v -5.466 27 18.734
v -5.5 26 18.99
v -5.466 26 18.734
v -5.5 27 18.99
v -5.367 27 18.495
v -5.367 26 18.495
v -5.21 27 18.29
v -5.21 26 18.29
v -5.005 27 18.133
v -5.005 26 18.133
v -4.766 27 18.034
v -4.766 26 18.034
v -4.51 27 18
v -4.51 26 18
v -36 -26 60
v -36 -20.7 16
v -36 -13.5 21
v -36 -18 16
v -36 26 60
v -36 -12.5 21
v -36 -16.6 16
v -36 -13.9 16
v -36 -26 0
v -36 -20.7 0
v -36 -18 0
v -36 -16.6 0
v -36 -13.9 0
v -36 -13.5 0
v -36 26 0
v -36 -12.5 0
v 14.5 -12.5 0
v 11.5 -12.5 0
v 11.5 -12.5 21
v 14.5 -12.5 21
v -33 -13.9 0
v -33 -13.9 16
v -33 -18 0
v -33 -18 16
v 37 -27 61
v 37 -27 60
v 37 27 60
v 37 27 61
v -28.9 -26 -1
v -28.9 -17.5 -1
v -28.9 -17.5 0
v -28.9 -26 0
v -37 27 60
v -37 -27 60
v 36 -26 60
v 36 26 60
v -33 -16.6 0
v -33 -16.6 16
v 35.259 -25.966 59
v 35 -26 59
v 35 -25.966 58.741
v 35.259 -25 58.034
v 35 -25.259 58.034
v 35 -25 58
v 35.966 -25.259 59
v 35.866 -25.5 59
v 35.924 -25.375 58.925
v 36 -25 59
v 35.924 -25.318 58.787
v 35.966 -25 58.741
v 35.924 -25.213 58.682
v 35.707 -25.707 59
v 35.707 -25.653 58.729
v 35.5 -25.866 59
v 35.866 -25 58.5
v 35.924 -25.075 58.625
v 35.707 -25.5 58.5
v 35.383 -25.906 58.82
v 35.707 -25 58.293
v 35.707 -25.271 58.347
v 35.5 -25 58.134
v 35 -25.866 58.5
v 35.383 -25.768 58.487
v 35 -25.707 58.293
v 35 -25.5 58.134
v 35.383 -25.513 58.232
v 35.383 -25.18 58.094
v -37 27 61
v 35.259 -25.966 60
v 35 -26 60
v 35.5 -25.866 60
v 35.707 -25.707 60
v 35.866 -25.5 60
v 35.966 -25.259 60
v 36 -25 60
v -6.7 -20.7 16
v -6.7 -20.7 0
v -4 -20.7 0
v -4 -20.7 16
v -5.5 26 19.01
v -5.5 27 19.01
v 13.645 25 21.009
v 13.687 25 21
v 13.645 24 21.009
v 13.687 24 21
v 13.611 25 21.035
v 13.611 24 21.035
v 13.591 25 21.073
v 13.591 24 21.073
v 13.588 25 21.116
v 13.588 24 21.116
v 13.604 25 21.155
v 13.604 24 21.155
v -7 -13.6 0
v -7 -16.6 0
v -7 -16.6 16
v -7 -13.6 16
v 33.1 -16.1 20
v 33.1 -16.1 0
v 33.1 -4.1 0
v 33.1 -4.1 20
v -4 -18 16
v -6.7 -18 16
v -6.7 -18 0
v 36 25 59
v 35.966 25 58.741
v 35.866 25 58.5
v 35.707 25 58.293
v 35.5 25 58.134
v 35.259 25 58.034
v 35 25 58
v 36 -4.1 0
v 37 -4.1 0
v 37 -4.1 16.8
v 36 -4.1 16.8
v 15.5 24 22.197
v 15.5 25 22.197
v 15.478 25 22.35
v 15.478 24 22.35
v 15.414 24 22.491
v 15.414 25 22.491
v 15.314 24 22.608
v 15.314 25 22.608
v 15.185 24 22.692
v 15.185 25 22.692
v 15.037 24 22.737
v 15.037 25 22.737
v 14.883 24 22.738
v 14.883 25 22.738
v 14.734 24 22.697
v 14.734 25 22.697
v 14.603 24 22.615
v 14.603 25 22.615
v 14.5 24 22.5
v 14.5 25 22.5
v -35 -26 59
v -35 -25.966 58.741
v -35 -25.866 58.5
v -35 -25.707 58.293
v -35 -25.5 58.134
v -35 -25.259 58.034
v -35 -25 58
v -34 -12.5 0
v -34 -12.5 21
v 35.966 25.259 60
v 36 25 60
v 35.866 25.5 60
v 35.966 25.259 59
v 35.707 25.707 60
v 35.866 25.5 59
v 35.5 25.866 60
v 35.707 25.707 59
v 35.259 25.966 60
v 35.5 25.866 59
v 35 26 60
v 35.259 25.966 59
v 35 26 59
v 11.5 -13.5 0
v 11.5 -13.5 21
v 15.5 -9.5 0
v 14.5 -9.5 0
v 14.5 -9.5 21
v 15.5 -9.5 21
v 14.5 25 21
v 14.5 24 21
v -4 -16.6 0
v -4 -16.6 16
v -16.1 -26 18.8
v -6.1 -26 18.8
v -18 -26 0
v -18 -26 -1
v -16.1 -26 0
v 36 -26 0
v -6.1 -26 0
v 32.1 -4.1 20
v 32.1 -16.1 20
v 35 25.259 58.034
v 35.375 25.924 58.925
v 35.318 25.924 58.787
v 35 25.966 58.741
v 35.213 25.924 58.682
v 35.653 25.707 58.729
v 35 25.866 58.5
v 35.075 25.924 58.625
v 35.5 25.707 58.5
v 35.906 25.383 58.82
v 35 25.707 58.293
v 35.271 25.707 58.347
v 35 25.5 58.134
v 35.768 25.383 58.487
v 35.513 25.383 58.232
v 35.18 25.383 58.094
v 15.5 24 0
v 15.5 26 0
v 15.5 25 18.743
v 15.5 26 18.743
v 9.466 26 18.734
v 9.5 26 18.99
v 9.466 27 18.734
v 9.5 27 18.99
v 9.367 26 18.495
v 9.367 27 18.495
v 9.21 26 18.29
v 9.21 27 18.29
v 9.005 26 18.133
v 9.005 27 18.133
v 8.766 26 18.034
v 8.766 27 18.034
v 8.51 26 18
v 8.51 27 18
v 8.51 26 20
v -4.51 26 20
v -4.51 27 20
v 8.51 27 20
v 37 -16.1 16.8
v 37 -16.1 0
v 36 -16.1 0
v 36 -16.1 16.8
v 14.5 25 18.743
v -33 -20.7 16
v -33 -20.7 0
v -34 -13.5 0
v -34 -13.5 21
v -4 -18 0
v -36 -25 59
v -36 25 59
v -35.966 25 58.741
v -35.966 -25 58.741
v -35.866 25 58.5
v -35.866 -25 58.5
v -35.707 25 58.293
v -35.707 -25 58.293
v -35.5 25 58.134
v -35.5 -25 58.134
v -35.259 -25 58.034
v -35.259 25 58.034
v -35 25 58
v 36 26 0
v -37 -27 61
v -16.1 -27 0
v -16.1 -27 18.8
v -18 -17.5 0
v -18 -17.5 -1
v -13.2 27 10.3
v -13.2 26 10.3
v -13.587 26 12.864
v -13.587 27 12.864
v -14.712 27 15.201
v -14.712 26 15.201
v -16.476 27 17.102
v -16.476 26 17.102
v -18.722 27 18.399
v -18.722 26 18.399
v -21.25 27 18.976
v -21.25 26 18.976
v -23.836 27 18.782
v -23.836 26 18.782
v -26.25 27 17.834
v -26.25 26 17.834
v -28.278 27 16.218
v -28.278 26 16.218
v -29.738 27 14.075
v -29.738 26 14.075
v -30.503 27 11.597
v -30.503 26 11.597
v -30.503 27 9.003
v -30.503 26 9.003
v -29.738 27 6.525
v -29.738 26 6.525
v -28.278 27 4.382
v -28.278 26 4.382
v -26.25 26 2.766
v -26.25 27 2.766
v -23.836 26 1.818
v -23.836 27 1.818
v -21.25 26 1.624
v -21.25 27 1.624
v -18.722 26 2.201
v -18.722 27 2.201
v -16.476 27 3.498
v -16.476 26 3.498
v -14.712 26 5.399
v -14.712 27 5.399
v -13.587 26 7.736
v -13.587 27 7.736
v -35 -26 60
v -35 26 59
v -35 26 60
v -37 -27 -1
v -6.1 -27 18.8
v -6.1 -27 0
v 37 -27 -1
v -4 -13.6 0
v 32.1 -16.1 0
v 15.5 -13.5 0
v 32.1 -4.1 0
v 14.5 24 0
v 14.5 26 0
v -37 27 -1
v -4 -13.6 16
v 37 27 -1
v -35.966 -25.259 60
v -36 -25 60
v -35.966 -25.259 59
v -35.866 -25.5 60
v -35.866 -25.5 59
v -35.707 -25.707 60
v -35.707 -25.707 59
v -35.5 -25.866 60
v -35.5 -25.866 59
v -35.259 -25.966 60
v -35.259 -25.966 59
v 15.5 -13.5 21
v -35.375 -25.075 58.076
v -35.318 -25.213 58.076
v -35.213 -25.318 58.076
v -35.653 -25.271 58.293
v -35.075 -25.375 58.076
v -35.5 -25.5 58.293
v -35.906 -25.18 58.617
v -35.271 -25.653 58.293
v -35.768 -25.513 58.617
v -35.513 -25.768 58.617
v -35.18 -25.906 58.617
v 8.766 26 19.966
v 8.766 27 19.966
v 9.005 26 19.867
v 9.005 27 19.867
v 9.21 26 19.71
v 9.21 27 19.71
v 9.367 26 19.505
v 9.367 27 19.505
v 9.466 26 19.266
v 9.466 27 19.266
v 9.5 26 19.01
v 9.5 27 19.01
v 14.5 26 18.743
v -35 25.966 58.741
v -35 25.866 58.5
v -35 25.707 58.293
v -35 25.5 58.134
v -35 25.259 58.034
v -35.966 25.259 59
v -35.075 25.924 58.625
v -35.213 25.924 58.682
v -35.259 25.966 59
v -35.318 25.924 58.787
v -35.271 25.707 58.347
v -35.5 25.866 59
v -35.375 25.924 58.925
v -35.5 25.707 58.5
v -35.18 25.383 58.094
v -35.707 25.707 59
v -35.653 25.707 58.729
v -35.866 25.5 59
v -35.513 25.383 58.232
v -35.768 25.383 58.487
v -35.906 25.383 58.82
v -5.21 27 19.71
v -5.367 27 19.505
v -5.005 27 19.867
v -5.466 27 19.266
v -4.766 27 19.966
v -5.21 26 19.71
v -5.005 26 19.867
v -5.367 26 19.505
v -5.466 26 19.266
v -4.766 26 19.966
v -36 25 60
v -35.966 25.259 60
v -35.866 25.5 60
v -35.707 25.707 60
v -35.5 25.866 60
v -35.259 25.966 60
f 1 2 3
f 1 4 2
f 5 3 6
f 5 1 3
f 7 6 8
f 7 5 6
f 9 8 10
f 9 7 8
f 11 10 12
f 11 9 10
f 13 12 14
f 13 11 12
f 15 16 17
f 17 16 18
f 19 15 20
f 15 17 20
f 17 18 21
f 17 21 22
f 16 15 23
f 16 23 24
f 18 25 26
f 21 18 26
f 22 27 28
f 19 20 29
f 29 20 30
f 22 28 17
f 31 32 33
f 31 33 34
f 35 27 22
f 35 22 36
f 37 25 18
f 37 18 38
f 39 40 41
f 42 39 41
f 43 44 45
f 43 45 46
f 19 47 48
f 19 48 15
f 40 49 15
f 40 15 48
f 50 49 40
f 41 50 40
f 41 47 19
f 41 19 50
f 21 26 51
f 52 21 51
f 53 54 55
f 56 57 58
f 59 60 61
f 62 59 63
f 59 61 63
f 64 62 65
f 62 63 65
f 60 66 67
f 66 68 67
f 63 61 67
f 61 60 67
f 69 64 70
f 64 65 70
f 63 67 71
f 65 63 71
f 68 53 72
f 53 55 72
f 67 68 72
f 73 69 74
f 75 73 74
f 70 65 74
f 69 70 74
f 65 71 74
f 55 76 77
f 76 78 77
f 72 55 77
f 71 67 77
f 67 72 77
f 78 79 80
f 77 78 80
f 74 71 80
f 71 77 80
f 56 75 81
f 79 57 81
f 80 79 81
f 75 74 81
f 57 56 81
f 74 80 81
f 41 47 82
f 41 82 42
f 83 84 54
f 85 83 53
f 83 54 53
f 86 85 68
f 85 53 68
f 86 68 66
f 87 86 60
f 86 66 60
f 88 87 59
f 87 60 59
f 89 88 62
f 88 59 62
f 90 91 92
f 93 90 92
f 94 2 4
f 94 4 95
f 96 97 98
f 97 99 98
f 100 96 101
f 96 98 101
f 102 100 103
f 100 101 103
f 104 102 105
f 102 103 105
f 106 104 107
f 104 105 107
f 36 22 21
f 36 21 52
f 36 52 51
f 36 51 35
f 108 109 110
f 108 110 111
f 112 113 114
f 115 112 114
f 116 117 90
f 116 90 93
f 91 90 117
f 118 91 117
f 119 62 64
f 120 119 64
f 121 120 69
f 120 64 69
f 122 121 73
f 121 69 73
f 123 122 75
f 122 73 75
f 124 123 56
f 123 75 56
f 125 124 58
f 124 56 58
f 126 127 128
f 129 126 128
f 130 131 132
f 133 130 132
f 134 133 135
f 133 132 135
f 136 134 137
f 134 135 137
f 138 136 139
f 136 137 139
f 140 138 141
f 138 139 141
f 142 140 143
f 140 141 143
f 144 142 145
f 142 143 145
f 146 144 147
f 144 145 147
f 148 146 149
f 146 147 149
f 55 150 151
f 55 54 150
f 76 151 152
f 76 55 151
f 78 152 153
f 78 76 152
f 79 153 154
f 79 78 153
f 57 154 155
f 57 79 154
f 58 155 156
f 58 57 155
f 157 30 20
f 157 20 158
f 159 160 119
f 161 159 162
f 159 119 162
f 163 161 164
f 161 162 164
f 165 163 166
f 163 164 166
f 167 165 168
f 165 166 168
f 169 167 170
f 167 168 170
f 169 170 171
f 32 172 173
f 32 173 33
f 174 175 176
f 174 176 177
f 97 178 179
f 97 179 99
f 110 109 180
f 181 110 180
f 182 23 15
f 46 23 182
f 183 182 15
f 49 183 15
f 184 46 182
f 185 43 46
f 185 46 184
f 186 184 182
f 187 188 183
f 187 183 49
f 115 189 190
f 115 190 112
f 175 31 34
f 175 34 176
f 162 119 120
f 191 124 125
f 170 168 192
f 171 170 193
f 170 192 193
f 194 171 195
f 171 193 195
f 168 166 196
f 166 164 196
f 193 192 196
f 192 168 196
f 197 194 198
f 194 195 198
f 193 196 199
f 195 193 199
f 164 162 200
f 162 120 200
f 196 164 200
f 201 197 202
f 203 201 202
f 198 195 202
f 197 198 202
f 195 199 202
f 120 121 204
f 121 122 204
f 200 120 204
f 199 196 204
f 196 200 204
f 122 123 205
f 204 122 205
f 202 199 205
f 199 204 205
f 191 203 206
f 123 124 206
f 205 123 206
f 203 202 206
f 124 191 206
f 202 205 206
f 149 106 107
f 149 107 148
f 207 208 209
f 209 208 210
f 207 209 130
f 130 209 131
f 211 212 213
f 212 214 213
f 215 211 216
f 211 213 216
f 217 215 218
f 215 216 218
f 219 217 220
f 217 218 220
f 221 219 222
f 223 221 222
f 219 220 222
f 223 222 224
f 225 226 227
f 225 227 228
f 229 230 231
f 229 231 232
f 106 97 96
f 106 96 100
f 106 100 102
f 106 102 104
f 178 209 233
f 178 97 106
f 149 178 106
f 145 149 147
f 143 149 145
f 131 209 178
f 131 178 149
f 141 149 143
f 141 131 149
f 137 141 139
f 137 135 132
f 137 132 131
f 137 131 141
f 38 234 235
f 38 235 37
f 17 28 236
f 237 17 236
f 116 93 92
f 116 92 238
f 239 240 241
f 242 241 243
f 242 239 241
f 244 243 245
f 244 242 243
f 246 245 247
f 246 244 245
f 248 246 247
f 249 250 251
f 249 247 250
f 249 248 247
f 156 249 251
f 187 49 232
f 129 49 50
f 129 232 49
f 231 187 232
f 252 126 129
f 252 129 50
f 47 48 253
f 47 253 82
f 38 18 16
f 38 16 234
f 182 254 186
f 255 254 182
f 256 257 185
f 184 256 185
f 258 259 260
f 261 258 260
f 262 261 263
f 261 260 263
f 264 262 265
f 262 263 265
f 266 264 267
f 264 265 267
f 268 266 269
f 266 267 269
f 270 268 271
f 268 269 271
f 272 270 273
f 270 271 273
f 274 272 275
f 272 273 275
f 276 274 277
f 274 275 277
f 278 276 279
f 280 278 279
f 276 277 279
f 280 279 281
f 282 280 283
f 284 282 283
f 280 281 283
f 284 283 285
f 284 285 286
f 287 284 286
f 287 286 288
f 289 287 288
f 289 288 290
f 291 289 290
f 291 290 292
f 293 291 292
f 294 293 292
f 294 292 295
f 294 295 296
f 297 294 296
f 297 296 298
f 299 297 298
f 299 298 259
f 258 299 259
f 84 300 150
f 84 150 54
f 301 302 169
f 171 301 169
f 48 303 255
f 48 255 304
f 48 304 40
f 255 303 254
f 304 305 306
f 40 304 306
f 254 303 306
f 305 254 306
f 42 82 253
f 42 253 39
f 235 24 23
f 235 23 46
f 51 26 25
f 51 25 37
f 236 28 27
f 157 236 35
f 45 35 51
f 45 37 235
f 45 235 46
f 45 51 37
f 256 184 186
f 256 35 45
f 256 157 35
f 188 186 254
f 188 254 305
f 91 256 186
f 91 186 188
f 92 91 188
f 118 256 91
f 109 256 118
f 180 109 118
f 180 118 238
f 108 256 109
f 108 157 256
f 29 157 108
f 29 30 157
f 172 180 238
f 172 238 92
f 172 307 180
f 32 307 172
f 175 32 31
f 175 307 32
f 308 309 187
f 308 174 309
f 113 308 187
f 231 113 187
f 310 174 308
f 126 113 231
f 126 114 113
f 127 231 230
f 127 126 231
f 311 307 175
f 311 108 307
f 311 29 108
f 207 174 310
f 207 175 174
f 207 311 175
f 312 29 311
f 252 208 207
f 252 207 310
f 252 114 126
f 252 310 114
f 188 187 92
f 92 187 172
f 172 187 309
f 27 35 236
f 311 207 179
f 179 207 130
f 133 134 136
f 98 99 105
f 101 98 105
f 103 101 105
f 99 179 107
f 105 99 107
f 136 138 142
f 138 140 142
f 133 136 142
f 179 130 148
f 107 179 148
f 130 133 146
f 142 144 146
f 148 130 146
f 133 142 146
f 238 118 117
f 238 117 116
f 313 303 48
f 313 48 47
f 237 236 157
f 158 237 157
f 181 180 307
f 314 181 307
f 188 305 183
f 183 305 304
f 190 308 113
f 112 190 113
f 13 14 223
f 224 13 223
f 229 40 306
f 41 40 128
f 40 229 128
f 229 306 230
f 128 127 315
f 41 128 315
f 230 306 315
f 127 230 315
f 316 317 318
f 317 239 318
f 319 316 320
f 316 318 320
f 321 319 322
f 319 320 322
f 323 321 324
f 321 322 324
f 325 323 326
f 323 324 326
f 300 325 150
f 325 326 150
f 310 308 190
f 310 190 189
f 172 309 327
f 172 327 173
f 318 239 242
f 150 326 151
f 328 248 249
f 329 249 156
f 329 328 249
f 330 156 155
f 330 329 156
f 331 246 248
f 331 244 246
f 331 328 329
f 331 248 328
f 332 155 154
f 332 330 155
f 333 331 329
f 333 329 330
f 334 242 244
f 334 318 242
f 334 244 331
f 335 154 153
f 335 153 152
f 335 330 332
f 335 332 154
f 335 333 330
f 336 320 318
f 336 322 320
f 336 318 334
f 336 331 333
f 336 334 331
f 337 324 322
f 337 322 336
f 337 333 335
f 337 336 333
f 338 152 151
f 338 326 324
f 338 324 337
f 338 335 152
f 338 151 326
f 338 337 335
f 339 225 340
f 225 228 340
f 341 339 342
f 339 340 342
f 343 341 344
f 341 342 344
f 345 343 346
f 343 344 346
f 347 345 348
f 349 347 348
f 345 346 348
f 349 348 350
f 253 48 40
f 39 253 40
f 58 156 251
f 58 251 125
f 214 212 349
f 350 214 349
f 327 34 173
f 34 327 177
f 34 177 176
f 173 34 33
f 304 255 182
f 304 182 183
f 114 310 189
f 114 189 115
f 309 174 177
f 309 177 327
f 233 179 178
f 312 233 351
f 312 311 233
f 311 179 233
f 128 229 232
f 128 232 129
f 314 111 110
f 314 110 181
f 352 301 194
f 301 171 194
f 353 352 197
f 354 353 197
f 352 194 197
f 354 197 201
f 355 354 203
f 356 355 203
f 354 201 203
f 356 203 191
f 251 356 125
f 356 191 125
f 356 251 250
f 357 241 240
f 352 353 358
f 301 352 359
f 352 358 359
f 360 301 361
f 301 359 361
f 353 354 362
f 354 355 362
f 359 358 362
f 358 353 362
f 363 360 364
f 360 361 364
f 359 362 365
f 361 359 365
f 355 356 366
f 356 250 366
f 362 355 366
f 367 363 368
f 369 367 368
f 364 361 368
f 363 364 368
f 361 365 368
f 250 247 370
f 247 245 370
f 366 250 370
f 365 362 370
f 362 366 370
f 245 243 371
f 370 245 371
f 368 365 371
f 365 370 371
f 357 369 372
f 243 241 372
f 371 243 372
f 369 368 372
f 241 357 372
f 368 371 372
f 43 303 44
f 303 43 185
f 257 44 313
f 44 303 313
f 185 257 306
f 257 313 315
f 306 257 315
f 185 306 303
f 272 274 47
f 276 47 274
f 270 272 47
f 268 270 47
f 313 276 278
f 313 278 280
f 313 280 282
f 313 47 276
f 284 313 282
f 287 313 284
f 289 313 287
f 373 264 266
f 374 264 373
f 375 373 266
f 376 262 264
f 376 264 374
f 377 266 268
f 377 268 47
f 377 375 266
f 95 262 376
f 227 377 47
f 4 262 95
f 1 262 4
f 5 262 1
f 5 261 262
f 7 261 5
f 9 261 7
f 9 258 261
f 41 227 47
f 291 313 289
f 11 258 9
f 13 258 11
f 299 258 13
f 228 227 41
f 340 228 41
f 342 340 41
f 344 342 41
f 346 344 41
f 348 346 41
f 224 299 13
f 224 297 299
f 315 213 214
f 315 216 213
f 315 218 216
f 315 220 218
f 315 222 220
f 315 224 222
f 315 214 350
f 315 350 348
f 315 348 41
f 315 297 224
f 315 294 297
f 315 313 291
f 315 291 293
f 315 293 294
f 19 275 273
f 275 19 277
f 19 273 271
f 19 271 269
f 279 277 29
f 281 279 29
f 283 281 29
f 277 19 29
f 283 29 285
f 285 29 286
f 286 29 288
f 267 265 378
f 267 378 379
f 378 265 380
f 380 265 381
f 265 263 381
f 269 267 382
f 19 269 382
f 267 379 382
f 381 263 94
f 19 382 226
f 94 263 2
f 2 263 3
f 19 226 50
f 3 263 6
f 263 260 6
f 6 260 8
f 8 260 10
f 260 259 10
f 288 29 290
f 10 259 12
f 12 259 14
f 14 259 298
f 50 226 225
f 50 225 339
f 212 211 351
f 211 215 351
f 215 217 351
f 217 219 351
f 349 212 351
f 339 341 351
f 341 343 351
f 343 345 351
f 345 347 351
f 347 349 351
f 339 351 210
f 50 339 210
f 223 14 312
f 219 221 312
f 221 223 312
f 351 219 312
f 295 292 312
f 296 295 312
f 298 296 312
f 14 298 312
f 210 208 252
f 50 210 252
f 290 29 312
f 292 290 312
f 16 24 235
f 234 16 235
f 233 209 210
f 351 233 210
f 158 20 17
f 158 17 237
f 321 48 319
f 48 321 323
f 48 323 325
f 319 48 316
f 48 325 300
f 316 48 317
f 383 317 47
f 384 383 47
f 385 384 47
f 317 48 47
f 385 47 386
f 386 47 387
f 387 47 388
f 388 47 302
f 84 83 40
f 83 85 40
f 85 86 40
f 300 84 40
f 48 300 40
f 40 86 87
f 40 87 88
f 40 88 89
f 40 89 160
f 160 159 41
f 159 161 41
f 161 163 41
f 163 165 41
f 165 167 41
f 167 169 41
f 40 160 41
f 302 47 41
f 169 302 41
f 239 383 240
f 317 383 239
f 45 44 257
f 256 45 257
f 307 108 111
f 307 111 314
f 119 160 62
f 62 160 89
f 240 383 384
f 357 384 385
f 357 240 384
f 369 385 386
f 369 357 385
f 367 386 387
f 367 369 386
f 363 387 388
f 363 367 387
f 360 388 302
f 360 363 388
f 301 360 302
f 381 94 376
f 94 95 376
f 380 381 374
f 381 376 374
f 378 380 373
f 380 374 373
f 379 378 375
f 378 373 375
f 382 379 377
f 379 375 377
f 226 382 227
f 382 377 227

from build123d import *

# Parameters (mm, degrees)
SKETCH_W        = 72
SKETCH_H        = 52
PAD_DEPTH       = 60
THICKNESS_T     = 1
SKETCH002_W     = 1
SKETCH002_H     = 2
SKETCH002_W_2   = 2
SKETCH002_H_2   = 1
PAD001_DEPTH    = 21
SKETCH003_R     = 8.7
SKETCH003_W     = 15
SKETCH003_H     = 2
POCKET_DEPTH    = 5
FILLET_R        = 0.99
PAD002_DEPTH    = 2
SKETCH005_W     = 1
SKETCH005_H     = 4
POCKET001_DEPTH = 2
FILLET001_R     = 0.1
SKETCH006_W     = 2.7
SKETCH006_H     = 2.7
SKETCH006_W_2   = 3
SKETCH006_H_2   = 3
PAD003_DEPTH    = 16
SKETCH011_W     = 10
SKETCH011_H     = 18.8
POCKET002_DEPTH = 1
SKETCH012_W     = 10.9
SKETCH012_H     = 8.5
POCKET003_DEPTH = 1
SKETCH013_W     = 12
SKETCH013_H     = 16.8
POCKET004_DEPTH = 1
SKETCH014_W     = 1
SKETCH014_H     = 12
PAD006_DEPTH    = 20
SKETCH009_W     = 74
SKETCH009_H     = 54
PAD004_DEPTH    = 1
SKETCH010_W     = 72
SKETCH010_H     = 52
PAD005_DEPTH    = 2
FILLET002_R     = 1


with BuildPart() as box:
    # Sketch → Pad (new body)
    with BuildSketch(Plane.XY):
        Rectangle(SKETCH_W, SKETCH_H)
    extrude(amount=PAD_DEPTH)

    # Thickness
    thickness_openings = [box.faces().sort_by_distance(p)[0] for p in [
        (0, 0, 60),
    ]]
    offset(amount=THICKNESS_T, openings=thickness_openings, kind=Kind.INTERSECTION)

    # Sketch002 (on Face5 of Thickness) → Pad001 (join)
    with BuildSketch(Plane.XY):
        Polygon((15.5, -13.5), (11.5, -13.5), (11.5, -12.5), (14.5, -12.5), (14.5, -9.5), (15.5, -9.5), align=None)
        with Locations((15, 25)):
            Rectangle(SKETCH002_W, SKETCH002_H)
        with Locations((-35, -13)):
            Rectangle(SKETCH002_W_2, SKETCH002_H_2)
    extrude(amount=PAD001_DEPTH)

    # Sketch003 (on Face1 of Pad001) → Pocket (cut)
    with BuildSketch(Plane.XZ.offset(-26)):
        with Locations((-21.9, 10.3)):
            Circle(SKETCH003_R)
        with Locations((2, 19)):
            Rectangle(SKETCH003_W, SKETCH003_H)
    extrude(amount=-POCKET_DEPTH, mode=Mode.SUBTRACT)

    # Fillet
    fillet_edges = [box.edges().sort_by_distance(p)[0] for p in [
        (-5.5, 26.5, 18),
        (-5.5, 26.5, 20),
        (9.5, 26.5, 20),
        (9.5, 26.5, 18),
    ]]
    fillet(fillet_edges, radius=FILLET_R)

    # Sketch004 (on Face1 of Fillet) → Pad002 (join)
    with BuildSketch(Plane.XZ.offset(-26)):
        with BuildLine():
            Line((15.5, 21), (13.5, 21))
            Line((13.5, 21), (14.5, 22.5))
            ThreePointArc((15.5, 22.197224), (15.112338, 22.71964), (14.5, 22.5))
            Line((15.5, 21), (15.5, 22.197224))
        make_face()
    extrude(amount=PAD002_DEPTH)

    # Sketch005 (on Face8 of Pad002) → Pocket001 (cut)
    with BuildSketch(Plane.YZ.offset(15.5)):
        with Locations((25.5, 20.743061)):
            Rectangle(SKETCH005_W, SKETCH005_H)
    extrude(amount=-POCKET001_DEPTH, mode=Mode.SUBTRACT)

    # Fillet001
    fillet001_edges = [box.edges().sort_by_distance(p)[0] for p in [
        (13.5, 24.5, 21),
    ]]
    fillet(fillet001_edges, radius=FILLET001_R)

    # Sketch006 (on Face11 of Fillet001) → Pad003 (join)
    with BuildSketch(Plane.XY):
        with Locations((-5.35, -19.35)):
            Rectangle(SKETCH006_W, SKETCH006_H)
        with Locations((-34.5, -19.35)):
            Rectangle(SKETCH006_W_2, SKETCH006_H)
        with Locations((-34.5, -15.25)):
            Rectangle(SKETCH006_W_2, SKETCH006_H)
        with Locations((-5.5, -15.1)):
            Rectangle(SKETCH006_W_2, SKETCH006_H_2)
    extrude(amount=PAD003_DEPTH)

    # Sketch011 (on Face62 of Pad003) → Pocket002 (cut)
    with BuildSketch(Plane.XZ.offset(27)):
        with Locations((-11.1, 9.4)):
            Rectangle(SKETCH011_W, SKETCH011_H)
    extrude(amount=-POCKET002_DEPTH, mode=Mode.SUBTRACT)

    # Sketch012 (on Face68 of Pocket002) → Pocket003 (cut)
    with BuildSketch(Plane(origin=(0, 0, -1), x_dir=(1, 0, 0), z_dir=(0, 0, -1))):
        with Locations((-23.45, 21.75)):
            Rectangle(SKETCH012_W, SKETCH012_H)
    extrude(amount=-POCKET003_DEPTH, mode=Mode.SUBTRACT)

    # Sketch013 (on Face72 of Pocket003) → Pocket004 (cut)
    with BuildSketch(Plane.YZ.offset(37)):
        with Locations((-10.1, 8.4)):
            Rectangle(SKETCH013_W, SKETCH013_H)
    extrude(amount=-POCKET004_DEPTH, mode=Mode.SUBTRACT)

    # Sketch014 (on Face11 of Pocket004) → Pad006 (join)
    with BuildSketch(Plane.XY):
        with Locations((32.6, -10.1)):
            Rectangle(SKETCH014_W, SKETCH014_H)
    extrude(amount=PAD006_DEPTH)


with BuildPart() as lid:
    # Sketch009 (on ShapeBinder) → Pad004 (new body)
    with BuildSketch(Plane.XY.offset(60)):
        Rectangle(SKETCH009_W, SKETCH009_H)
    extrude(amount=PAD004_DEPTH)

    # Sketch010 (on Face5 of Pad004) → Pad005 (join)
    with BuildSketch(Plane(origin=(0, 0, 60), x_dir=(1, 0, 0), z_dir=(0, 0, -1))):
        Rectangle(SKETCH010_W, SKETCH010_H)
    extrude(amount=PAD005_DEPTH)

    # Fillet002
    fillet002_edges = [lid.edges().sort_by_distance(p)[0] for p in [
        (-36, -26, 59),
        (-36, 0, 58),
        (0, -26, 58),
        (36, -26, 59),
        (36, 0, 58),
        (36, 26, 59),
        (0, 26, 58),
        (-36, 26, 59),
    ]]
    fillet(fillet002_edges, radius=FILLET002_R)


solid = Compound([box.part, lid.part])
